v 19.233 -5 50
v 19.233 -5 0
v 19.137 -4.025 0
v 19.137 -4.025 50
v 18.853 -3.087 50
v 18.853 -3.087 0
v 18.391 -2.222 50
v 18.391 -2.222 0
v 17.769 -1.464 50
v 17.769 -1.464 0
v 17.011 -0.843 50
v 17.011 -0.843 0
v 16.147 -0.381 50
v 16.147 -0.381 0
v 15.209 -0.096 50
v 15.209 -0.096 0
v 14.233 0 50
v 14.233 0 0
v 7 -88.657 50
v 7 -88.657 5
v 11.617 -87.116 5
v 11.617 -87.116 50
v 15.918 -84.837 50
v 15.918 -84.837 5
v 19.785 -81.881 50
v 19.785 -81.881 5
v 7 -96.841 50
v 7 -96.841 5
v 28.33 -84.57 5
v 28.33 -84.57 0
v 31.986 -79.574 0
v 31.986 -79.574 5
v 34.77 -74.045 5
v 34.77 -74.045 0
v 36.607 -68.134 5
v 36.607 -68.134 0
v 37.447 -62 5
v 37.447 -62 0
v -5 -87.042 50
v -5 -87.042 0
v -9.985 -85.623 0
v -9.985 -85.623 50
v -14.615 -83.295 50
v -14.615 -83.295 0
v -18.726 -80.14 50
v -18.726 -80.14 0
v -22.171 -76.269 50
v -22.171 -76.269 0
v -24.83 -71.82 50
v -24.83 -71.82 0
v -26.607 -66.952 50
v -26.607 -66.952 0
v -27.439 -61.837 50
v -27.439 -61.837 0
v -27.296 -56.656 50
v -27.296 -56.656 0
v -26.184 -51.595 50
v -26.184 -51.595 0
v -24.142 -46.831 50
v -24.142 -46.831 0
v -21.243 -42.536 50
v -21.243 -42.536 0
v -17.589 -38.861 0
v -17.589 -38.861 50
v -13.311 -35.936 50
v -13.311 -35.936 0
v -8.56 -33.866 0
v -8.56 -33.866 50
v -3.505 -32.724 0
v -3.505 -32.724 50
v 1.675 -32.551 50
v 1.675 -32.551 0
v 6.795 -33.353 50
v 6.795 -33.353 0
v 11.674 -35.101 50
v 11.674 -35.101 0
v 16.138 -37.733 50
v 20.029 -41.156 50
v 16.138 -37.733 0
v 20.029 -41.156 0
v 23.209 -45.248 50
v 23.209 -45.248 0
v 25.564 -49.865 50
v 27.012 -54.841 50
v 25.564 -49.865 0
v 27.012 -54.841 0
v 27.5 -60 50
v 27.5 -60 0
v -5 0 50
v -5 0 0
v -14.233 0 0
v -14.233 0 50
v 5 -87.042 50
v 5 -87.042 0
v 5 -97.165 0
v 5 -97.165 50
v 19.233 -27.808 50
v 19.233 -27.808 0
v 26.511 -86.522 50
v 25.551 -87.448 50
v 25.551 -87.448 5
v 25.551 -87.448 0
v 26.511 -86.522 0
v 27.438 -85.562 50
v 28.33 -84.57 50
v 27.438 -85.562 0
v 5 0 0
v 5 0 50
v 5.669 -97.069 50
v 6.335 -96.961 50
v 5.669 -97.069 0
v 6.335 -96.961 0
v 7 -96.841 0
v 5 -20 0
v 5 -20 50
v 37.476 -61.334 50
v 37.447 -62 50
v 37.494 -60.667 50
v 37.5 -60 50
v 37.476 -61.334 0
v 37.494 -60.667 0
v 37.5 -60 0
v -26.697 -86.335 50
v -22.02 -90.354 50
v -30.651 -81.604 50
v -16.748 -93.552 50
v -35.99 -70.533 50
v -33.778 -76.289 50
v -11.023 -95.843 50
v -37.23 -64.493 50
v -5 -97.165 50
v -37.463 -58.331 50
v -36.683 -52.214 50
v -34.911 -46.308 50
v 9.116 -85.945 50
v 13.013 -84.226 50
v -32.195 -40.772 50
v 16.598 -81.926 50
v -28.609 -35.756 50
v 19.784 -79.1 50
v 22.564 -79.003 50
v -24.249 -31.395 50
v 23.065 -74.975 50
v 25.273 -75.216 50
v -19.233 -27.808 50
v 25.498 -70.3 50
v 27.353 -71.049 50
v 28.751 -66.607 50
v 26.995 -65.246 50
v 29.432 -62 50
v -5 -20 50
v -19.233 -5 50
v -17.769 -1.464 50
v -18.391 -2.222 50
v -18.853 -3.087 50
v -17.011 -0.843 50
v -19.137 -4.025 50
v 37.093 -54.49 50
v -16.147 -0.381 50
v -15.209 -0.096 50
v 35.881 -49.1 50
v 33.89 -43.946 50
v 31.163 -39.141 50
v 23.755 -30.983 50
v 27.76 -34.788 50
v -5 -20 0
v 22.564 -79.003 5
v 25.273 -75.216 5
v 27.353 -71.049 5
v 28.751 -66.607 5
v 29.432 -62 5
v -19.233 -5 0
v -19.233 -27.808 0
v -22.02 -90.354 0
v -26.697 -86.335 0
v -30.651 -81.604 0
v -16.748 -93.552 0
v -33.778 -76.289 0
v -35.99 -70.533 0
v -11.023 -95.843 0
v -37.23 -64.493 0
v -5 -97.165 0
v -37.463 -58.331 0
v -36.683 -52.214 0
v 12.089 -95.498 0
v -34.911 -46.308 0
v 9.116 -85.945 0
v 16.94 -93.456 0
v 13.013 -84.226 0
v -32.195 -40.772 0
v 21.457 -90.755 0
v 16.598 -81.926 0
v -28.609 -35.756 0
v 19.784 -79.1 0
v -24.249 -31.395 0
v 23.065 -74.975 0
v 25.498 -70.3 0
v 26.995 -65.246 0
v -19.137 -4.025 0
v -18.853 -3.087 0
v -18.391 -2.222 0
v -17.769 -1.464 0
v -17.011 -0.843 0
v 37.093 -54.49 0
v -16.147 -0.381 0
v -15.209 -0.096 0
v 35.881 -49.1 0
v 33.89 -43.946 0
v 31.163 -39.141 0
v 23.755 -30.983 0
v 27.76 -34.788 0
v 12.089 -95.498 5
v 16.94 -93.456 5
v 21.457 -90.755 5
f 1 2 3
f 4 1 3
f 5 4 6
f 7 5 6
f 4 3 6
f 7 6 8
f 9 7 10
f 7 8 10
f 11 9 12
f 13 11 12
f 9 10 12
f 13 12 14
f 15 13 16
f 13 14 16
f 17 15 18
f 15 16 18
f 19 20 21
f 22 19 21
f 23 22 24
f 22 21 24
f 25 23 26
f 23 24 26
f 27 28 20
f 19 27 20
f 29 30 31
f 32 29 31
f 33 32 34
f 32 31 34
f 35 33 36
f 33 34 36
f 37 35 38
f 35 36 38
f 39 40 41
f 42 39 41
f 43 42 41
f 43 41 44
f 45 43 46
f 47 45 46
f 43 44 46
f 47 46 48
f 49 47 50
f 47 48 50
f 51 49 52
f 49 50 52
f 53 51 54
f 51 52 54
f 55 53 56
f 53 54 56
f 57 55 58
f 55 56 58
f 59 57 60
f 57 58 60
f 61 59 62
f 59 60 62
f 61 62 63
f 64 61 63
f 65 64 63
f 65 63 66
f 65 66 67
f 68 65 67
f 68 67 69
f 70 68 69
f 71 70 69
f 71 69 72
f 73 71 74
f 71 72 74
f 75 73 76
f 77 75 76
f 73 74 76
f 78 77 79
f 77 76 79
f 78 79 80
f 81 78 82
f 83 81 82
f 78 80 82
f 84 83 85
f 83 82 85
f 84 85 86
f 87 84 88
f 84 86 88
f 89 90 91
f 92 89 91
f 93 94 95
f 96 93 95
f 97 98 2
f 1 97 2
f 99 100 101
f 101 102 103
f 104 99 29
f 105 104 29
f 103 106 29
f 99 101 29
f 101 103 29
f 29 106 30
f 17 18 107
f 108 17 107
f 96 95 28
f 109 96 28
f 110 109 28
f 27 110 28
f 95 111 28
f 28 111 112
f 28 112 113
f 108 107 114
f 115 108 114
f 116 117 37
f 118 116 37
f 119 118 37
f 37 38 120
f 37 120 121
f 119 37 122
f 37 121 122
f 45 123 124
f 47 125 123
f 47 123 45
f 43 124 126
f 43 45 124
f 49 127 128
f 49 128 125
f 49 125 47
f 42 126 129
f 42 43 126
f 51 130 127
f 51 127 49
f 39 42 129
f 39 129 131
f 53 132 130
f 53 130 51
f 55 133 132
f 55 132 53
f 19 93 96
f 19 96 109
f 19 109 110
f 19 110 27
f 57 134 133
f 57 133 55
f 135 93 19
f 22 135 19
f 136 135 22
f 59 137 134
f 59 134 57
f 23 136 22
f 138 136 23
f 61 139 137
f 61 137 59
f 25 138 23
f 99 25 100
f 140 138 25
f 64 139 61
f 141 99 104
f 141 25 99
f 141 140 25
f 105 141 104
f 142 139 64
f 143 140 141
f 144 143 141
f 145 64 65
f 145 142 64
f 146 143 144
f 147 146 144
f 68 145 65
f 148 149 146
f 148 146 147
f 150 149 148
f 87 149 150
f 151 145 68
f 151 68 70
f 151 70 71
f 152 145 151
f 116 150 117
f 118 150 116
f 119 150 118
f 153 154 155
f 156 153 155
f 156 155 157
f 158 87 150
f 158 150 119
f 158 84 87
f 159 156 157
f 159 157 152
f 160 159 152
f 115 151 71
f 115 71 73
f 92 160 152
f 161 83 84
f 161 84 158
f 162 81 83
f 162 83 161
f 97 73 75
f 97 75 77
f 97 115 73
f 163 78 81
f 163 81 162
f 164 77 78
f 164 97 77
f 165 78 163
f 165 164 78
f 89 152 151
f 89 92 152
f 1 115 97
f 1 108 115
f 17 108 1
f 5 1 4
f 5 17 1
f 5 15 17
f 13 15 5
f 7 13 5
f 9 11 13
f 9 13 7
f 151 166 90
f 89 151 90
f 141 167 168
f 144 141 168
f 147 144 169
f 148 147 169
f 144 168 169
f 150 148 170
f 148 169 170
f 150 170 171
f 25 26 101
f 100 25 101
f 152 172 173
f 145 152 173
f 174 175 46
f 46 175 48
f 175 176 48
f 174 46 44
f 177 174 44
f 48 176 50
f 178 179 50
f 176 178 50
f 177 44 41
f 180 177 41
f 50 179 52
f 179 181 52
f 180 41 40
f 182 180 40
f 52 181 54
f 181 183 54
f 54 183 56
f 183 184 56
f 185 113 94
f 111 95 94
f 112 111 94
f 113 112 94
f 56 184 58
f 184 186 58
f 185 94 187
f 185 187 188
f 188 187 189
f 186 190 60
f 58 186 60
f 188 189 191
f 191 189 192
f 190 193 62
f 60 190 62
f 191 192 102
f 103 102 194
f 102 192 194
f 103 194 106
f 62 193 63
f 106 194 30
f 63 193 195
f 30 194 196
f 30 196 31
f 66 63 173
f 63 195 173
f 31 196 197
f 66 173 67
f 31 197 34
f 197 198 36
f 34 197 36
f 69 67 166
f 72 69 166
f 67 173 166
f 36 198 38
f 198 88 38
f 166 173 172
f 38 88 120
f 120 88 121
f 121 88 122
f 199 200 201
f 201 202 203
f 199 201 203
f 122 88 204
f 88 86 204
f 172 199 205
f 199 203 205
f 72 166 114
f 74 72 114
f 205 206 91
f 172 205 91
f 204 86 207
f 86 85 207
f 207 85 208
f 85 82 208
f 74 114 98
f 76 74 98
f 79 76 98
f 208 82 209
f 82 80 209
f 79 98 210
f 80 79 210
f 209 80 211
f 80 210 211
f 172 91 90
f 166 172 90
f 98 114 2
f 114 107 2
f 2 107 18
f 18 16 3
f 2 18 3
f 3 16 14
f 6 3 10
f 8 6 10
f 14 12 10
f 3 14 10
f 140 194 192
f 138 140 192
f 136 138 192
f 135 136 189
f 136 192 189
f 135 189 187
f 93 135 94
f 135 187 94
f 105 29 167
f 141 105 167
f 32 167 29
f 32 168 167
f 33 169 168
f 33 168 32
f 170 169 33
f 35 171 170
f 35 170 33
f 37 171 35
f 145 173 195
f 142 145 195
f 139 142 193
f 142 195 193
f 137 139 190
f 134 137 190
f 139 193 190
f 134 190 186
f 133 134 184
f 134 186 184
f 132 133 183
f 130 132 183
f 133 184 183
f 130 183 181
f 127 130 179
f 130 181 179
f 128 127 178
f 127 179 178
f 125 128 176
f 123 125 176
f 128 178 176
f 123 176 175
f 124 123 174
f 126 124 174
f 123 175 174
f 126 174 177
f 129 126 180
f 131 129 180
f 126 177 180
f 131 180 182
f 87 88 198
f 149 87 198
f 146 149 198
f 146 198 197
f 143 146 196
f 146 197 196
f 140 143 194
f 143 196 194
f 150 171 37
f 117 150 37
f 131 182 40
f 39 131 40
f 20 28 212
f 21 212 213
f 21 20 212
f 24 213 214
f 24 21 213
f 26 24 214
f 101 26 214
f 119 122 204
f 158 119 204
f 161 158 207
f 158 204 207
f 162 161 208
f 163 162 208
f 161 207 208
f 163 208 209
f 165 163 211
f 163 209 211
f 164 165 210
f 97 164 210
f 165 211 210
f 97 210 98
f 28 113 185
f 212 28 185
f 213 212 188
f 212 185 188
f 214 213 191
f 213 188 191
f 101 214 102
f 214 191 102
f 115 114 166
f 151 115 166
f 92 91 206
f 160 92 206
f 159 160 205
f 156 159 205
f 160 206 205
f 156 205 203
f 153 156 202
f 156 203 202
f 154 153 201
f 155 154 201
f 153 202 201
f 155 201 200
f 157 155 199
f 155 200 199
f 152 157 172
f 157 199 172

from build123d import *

# Parameters (mm, degrees)
F1_DEPTH = 50
F2_DEPTH = 5


# Not quite as in the source:
# - a feature of the source that left no trace in its solid (it failed there, or was rolled back) is left out


with BuildPart() as f1:
    # F0 (on Top) → F1 (new body)
    with BuildSketch(Plane.XY):
        with BuildLine():
            Line((-19.2333690145, -5), (-19.2333690145, -27.8079588042))
            ThreePointArc((-19.2333690145, -27.8079588042), (-36.7344496958, -67.5385811362), (-5, -97.1651718683))
            Line((-5, -97.1651718683), (-5, -87.041634566))
            ThreePointArc((-5, -87.041634566), (-17.5890590993, -38.8605818434), (27.5, -60))
            ThreePointArc((27.5, -60), (25.4982682633, -70.2999182314), (19.7844861402, -79.1003693203))
            ThreePointArc((19.7844861402, -79.1003693203), (13.0128248945, -84.2263573049), (5, -87.041634566))
            Line((5, -87.041634566), (5, -97.1651718683))
            ThreePointArc((5, -97.1651718683), (6.0021906226, -97.0165328972), (7, -96.8408740396))
            Line((7, -96.8408740396), (7, -88.6574597618))
            ThreePointArc((7, -88.6574597618), (13.8146262679, -86.0654196413), (19.7854086015, -81.8812158362))
            Line((19.7854086015, -81.8812158362), (25.5513297312, -87.4477603634))
            ThreePointArc((25.5513297312, -87.4477603634), (26.9788447366, -86.045958164), (28.3295652687, -84.5700169249))
            Line((28.3295652687, -84.5700169249), (22.563644139, -79.0034723976))
            ThreePointArc((22.563644139, -79.0034723976), (27.3526877734, -71.0490031936), (29.4321253055, -62))
            Line((29.4321253055, -62), (37.4466286867, -62))
            ThreePointArc((37.4466286867, -62), (37.4866547971, -61.0003559988), (37.5, -60))
            ThreePointArc((37.5, -60), (32.6151907709, -41.4932625517), (19.2333690145, -27.8079588042))
            Line((19.2333690145, -27.8079588042), (19.2333690145, -5))
            ThreePointArc((19.2333690145, -5), (17.7689029204, -1.4644660941), (14.2333690145, 0))
            Line((14.2333690145, 0), (5, 0))
            Line((5, 0), (5, -20))
            Line((5, -20), (0, -20))
            Line((0, -20), (-5, -20))
            Line((-5, -20), (-5, 0))
            Line((-5, 0), (-14.2333690145, 0))
            ThreePointArc((-14.2333690145, 0), (-17.7689029204, -1.4644660941), (-19.2333690145, -5))
        make_face()
    extrude(amount=F1_DEPTH)

    # F0 (on Top) → F2 (join)
    with BuildSketch(Plane.XY):
        with BuildLine():
            Line((7, -88.6574597618), (7, -96.8408740396))
            ThreePointArc((7, -96.8408740396), (16.9397435916, -93.4558677522), (25.5513297312, -87.4477603634))
            Line((25.5513297312, -87.4477603634), (19.7854086015, -81.8812158362))
            ThreePointArc((19.7854086015, -81.8812158362), (13.8146262679, -86.0654196413), (7, -88.6574597618))
        make_face()
        with BuildLine():
            Line((22.563644139, -79.0034723976), (28.3295652687, -84.5700169249))
            ThreePointArc((28.3295652687, -84.5700169249), (34.7703658136, -74.0453430428), (37.4466286867, -62))
            Line((37.4466286867, -62), (29.4321253055, -62))
            ThreePointArc((29.4321253055, -62), (27.3526877734, -71.0490031936), (22.563644139, -79.0034723976))
        make_face()
    extrude(amount=F2_DEPTH)


solid = f1.part
